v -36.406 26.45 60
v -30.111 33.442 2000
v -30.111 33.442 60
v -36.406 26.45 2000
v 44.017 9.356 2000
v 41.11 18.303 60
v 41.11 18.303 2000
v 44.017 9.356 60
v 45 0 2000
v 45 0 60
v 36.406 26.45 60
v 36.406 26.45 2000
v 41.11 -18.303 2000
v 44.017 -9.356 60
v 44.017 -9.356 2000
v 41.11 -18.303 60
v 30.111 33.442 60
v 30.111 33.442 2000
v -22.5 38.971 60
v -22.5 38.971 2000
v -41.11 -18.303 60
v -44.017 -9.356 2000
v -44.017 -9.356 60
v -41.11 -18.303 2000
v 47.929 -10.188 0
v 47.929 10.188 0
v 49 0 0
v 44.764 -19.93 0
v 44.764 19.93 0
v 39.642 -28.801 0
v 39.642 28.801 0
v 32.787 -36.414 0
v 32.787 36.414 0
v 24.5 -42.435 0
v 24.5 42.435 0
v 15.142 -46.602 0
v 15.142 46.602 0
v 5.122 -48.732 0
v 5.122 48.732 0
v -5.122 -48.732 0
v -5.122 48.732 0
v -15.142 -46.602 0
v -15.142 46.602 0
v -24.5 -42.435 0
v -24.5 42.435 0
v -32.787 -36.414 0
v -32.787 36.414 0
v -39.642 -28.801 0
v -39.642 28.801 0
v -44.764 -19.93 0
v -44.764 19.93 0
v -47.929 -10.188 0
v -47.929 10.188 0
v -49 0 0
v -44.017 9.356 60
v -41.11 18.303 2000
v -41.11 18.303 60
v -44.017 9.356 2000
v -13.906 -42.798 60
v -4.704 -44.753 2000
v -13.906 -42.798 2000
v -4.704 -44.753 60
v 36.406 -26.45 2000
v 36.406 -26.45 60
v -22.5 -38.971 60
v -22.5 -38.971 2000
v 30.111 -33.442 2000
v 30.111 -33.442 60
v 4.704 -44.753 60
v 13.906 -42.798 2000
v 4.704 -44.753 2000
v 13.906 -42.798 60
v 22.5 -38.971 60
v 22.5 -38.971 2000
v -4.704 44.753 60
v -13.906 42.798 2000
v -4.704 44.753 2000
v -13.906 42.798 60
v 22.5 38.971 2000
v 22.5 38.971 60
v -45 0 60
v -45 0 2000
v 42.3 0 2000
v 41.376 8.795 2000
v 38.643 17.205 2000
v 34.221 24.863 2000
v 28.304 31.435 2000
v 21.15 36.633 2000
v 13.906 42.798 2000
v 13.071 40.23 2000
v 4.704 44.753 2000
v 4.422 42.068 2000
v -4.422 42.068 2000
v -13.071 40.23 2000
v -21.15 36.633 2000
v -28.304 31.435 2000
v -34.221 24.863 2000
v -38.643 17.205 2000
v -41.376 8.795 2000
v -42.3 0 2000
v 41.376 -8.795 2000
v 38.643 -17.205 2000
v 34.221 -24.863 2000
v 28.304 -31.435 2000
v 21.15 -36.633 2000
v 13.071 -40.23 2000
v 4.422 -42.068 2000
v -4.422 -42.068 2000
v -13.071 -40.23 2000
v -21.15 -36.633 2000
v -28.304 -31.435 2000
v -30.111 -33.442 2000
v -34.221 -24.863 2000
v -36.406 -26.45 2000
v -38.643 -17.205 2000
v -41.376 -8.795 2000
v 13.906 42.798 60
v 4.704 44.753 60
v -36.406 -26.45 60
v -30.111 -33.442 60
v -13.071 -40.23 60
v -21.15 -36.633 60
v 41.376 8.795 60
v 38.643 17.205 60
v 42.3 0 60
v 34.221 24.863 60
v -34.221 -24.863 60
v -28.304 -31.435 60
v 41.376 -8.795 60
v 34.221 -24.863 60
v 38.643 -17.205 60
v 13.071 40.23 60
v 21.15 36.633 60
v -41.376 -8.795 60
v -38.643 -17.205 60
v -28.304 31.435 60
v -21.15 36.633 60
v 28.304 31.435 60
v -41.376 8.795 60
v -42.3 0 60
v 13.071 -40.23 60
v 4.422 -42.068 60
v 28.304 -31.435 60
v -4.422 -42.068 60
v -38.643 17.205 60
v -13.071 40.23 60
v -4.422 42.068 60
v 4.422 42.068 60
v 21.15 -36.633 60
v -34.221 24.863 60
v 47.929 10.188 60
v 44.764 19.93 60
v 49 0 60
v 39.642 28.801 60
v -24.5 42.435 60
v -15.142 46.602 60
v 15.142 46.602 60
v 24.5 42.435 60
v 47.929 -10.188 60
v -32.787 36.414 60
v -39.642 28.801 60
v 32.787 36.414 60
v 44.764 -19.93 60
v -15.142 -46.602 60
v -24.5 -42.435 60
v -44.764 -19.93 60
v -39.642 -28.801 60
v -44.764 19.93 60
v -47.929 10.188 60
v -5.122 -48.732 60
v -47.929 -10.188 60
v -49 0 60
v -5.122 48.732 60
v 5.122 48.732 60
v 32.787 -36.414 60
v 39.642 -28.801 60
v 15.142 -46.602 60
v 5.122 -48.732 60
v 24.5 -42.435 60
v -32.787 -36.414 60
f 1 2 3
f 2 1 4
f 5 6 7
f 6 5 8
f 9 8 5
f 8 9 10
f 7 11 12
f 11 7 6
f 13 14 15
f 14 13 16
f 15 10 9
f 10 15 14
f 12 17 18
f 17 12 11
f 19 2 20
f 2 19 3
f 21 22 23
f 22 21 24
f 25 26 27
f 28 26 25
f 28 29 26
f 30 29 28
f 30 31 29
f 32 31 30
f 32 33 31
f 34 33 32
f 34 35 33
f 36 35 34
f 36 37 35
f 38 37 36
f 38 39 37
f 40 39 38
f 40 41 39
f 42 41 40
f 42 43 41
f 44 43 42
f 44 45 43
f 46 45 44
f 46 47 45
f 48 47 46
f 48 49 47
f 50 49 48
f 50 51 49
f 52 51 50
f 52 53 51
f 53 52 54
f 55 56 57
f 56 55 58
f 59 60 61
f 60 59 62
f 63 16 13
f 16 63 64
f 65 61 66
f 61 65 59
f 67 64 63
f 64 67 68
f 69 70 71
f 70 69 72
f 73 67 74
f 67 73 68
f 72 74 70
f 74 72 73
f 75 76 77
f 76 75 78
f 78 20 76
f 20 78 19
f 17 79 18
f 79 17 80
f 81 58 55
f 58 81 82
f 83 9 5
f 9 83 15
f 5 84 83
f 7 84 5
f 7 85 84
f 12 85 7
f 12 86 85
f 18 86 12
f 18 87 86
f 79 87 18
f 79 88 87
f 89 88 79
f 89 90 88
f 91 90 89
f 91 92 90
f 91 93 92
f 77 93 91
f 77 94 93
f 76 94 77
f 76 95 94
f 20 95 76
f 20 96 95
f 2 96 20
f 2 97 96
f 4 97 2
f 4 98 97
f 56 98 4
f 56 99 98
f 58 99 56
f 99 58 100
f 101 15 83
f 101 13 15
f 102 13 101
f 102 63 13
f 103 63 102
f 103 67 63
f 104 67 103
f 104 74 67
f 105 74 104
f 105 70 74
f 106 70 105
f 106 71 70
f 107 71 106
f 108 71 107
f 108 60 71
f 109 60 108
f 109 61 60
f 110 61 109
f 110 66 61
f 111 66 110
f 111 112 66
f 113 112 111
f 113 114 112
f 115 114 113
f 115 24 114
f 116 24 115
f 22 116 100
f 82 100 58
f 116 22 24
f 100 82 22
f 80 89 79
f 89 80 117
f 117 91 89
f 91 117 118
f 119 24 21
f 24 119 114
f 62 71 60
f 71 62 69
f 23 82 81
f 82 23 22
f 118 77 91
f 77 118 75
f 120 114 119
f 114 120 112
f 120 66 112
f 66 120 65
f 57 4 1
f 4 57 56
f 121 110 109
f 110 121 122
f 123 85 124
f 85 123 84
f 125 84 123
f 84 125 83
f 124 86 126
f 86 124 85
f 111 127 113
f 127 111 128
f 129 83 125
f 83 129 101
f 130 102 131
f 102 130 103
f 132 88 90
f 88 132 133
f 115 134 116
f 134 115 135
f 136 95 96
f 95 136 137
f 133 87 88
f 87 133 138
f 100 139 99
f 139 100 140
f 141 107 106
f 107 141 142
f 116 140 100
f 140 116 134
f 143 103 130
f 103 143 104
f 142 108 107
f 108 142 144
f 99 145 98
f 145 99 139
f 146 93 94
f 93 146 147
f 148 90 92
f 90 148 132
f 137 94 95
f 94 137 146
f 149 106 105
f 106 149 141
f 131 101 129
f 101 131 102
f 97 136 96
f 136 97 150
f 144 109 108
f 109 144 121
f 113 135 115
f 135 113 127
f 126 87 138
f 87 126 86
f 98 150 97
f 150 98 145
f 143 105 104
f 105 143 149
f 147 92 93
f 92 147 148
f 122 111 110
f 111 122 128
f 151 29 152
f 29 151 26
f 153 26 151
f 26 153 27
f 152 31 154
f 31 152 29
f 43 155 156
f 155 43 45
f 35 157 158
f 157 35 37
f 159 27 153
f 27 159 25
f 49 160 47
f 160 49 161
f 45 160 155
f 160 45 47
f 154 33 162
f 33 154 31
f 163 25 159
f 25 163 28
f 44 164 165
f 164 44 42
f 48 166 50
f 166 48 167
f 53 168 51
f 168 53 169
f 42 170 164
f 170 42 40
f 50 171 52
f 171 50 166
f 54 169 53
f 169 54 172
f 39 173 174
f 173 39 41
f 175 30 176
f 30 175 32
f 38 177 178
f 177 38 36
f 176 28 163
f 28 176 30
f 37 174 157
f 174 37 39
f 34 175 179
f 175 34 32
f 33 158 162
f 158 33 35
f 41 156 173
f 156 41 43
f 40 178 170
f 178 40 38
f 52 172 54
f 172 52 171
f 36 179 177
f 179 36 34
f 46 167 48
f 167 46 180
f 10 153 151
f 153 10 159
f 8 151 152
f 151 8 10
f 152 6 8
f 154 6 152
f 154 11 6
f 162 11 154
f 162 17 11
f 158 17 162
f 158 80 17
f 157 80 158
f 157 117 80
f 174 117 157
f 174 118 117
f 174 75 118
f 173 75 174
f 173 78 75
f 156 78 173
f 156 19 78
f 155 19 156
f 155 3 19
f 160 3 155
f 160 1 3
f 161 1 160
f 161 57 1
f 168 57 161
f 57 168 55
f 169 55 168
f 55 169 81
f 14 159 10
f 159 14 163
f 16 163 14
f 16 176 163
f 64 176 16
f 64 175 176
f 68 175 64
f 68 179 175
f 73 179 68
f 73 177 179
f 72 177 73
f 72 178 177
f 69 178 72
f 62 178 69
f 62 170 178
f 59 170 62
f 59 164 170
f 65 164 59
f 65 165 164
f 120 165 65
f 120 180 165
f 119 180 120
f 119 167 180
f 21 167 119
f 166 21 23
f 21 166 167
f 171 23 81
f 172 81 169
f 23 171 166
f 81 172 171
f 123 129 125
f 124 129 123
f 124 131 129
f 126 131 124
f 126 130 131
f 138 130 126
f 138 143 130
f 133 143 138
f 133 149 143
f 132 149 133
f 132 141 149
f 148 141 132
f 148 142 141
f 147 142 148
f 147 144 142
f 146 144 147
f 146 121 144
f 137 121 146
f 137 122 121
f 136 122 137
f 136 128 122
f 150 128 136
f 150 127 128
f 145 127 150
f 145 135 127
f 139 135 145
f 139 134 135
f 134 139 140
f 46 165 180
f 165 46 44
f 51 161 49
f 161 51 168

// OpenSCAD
// Parameters
pipe_standard = 1; //[1:1:1]
nominal_diameter = 90; //[50:180:1]
length_mm = 2000; //[1000:4000:10]
include_end_fitting = 1; //[0:1:1]
pipe_od = 90; //[50:180:1]
pipe_wall = 2.7; //[1.5:5.4:0.1]
pipe_id = 84.6; //[40:170:0.1]
overlap = 1; //[0.5:2:0.1]
fitting_length = 60; //[0:120:1]
fitting_od = 98; //[90:140:1]
fitting_wall = 3.2; //[2:6:0.1]
socket_depth = 45; //[20:80:1]
stop_ring_thickness = 4; //[2:10:0.5]
chamfer_length = 6; //[2:15:0.5]
chamfer_extra_radius = 2; //[0.5:6:0.5]

// HT Pipe - complete geometry
module ht_pipe() {
  color([0.85, 0.85, 0.8]) {
    // Pipe segment
    difference() {
      cylinder(h=length_mm, r=pipe_od/2, center=false);
      translate([0, 0, -overlap])
        cylinder(h=length_mm + 2*overlap, r=(pipe_od - 2*pipe_wall)/2, center=false);
    }
    
    // End fitting
    if (include_end_fitting) {
      difference() {
        union() {
          cylinder(h=fitting_length, r=fitting_od/2, center=false);
          translate([0, 0, length_mm - overlap])
            cylinder(h=overlap, r=pipe_od/2 + overlap, center=false);
        }
        translate([0, 0, length_mm - overlap - overlap])
          cylinder(h=fitting_length + 2*overlap, r=(fitting_od - 2*fitting_wall)/2, center=false);
        translate([0, 0, length_mm - overlap])
          cylinder(h=socket_depth + overlap, r=pipe_od/2 + overlap, center=false);
        translate([0, 0, length_mm - overlap + socket_depth - stop_ring_thickness])
          cylinder(h=stop_ring_thickness + overlap, r=(pipe_od - 2*pipe_wall)/2, center=false);
        translate([0, 0, length_mm - overlap])
          cylinder(h=chamfer_length, r1=pipe_od/2 + chamfer_extra_radius, r2=pipe_od/2, center=false);
      }
    }
  }
}

// Assembly
module assembly() {
  ht_pipe();
}

assembly();
